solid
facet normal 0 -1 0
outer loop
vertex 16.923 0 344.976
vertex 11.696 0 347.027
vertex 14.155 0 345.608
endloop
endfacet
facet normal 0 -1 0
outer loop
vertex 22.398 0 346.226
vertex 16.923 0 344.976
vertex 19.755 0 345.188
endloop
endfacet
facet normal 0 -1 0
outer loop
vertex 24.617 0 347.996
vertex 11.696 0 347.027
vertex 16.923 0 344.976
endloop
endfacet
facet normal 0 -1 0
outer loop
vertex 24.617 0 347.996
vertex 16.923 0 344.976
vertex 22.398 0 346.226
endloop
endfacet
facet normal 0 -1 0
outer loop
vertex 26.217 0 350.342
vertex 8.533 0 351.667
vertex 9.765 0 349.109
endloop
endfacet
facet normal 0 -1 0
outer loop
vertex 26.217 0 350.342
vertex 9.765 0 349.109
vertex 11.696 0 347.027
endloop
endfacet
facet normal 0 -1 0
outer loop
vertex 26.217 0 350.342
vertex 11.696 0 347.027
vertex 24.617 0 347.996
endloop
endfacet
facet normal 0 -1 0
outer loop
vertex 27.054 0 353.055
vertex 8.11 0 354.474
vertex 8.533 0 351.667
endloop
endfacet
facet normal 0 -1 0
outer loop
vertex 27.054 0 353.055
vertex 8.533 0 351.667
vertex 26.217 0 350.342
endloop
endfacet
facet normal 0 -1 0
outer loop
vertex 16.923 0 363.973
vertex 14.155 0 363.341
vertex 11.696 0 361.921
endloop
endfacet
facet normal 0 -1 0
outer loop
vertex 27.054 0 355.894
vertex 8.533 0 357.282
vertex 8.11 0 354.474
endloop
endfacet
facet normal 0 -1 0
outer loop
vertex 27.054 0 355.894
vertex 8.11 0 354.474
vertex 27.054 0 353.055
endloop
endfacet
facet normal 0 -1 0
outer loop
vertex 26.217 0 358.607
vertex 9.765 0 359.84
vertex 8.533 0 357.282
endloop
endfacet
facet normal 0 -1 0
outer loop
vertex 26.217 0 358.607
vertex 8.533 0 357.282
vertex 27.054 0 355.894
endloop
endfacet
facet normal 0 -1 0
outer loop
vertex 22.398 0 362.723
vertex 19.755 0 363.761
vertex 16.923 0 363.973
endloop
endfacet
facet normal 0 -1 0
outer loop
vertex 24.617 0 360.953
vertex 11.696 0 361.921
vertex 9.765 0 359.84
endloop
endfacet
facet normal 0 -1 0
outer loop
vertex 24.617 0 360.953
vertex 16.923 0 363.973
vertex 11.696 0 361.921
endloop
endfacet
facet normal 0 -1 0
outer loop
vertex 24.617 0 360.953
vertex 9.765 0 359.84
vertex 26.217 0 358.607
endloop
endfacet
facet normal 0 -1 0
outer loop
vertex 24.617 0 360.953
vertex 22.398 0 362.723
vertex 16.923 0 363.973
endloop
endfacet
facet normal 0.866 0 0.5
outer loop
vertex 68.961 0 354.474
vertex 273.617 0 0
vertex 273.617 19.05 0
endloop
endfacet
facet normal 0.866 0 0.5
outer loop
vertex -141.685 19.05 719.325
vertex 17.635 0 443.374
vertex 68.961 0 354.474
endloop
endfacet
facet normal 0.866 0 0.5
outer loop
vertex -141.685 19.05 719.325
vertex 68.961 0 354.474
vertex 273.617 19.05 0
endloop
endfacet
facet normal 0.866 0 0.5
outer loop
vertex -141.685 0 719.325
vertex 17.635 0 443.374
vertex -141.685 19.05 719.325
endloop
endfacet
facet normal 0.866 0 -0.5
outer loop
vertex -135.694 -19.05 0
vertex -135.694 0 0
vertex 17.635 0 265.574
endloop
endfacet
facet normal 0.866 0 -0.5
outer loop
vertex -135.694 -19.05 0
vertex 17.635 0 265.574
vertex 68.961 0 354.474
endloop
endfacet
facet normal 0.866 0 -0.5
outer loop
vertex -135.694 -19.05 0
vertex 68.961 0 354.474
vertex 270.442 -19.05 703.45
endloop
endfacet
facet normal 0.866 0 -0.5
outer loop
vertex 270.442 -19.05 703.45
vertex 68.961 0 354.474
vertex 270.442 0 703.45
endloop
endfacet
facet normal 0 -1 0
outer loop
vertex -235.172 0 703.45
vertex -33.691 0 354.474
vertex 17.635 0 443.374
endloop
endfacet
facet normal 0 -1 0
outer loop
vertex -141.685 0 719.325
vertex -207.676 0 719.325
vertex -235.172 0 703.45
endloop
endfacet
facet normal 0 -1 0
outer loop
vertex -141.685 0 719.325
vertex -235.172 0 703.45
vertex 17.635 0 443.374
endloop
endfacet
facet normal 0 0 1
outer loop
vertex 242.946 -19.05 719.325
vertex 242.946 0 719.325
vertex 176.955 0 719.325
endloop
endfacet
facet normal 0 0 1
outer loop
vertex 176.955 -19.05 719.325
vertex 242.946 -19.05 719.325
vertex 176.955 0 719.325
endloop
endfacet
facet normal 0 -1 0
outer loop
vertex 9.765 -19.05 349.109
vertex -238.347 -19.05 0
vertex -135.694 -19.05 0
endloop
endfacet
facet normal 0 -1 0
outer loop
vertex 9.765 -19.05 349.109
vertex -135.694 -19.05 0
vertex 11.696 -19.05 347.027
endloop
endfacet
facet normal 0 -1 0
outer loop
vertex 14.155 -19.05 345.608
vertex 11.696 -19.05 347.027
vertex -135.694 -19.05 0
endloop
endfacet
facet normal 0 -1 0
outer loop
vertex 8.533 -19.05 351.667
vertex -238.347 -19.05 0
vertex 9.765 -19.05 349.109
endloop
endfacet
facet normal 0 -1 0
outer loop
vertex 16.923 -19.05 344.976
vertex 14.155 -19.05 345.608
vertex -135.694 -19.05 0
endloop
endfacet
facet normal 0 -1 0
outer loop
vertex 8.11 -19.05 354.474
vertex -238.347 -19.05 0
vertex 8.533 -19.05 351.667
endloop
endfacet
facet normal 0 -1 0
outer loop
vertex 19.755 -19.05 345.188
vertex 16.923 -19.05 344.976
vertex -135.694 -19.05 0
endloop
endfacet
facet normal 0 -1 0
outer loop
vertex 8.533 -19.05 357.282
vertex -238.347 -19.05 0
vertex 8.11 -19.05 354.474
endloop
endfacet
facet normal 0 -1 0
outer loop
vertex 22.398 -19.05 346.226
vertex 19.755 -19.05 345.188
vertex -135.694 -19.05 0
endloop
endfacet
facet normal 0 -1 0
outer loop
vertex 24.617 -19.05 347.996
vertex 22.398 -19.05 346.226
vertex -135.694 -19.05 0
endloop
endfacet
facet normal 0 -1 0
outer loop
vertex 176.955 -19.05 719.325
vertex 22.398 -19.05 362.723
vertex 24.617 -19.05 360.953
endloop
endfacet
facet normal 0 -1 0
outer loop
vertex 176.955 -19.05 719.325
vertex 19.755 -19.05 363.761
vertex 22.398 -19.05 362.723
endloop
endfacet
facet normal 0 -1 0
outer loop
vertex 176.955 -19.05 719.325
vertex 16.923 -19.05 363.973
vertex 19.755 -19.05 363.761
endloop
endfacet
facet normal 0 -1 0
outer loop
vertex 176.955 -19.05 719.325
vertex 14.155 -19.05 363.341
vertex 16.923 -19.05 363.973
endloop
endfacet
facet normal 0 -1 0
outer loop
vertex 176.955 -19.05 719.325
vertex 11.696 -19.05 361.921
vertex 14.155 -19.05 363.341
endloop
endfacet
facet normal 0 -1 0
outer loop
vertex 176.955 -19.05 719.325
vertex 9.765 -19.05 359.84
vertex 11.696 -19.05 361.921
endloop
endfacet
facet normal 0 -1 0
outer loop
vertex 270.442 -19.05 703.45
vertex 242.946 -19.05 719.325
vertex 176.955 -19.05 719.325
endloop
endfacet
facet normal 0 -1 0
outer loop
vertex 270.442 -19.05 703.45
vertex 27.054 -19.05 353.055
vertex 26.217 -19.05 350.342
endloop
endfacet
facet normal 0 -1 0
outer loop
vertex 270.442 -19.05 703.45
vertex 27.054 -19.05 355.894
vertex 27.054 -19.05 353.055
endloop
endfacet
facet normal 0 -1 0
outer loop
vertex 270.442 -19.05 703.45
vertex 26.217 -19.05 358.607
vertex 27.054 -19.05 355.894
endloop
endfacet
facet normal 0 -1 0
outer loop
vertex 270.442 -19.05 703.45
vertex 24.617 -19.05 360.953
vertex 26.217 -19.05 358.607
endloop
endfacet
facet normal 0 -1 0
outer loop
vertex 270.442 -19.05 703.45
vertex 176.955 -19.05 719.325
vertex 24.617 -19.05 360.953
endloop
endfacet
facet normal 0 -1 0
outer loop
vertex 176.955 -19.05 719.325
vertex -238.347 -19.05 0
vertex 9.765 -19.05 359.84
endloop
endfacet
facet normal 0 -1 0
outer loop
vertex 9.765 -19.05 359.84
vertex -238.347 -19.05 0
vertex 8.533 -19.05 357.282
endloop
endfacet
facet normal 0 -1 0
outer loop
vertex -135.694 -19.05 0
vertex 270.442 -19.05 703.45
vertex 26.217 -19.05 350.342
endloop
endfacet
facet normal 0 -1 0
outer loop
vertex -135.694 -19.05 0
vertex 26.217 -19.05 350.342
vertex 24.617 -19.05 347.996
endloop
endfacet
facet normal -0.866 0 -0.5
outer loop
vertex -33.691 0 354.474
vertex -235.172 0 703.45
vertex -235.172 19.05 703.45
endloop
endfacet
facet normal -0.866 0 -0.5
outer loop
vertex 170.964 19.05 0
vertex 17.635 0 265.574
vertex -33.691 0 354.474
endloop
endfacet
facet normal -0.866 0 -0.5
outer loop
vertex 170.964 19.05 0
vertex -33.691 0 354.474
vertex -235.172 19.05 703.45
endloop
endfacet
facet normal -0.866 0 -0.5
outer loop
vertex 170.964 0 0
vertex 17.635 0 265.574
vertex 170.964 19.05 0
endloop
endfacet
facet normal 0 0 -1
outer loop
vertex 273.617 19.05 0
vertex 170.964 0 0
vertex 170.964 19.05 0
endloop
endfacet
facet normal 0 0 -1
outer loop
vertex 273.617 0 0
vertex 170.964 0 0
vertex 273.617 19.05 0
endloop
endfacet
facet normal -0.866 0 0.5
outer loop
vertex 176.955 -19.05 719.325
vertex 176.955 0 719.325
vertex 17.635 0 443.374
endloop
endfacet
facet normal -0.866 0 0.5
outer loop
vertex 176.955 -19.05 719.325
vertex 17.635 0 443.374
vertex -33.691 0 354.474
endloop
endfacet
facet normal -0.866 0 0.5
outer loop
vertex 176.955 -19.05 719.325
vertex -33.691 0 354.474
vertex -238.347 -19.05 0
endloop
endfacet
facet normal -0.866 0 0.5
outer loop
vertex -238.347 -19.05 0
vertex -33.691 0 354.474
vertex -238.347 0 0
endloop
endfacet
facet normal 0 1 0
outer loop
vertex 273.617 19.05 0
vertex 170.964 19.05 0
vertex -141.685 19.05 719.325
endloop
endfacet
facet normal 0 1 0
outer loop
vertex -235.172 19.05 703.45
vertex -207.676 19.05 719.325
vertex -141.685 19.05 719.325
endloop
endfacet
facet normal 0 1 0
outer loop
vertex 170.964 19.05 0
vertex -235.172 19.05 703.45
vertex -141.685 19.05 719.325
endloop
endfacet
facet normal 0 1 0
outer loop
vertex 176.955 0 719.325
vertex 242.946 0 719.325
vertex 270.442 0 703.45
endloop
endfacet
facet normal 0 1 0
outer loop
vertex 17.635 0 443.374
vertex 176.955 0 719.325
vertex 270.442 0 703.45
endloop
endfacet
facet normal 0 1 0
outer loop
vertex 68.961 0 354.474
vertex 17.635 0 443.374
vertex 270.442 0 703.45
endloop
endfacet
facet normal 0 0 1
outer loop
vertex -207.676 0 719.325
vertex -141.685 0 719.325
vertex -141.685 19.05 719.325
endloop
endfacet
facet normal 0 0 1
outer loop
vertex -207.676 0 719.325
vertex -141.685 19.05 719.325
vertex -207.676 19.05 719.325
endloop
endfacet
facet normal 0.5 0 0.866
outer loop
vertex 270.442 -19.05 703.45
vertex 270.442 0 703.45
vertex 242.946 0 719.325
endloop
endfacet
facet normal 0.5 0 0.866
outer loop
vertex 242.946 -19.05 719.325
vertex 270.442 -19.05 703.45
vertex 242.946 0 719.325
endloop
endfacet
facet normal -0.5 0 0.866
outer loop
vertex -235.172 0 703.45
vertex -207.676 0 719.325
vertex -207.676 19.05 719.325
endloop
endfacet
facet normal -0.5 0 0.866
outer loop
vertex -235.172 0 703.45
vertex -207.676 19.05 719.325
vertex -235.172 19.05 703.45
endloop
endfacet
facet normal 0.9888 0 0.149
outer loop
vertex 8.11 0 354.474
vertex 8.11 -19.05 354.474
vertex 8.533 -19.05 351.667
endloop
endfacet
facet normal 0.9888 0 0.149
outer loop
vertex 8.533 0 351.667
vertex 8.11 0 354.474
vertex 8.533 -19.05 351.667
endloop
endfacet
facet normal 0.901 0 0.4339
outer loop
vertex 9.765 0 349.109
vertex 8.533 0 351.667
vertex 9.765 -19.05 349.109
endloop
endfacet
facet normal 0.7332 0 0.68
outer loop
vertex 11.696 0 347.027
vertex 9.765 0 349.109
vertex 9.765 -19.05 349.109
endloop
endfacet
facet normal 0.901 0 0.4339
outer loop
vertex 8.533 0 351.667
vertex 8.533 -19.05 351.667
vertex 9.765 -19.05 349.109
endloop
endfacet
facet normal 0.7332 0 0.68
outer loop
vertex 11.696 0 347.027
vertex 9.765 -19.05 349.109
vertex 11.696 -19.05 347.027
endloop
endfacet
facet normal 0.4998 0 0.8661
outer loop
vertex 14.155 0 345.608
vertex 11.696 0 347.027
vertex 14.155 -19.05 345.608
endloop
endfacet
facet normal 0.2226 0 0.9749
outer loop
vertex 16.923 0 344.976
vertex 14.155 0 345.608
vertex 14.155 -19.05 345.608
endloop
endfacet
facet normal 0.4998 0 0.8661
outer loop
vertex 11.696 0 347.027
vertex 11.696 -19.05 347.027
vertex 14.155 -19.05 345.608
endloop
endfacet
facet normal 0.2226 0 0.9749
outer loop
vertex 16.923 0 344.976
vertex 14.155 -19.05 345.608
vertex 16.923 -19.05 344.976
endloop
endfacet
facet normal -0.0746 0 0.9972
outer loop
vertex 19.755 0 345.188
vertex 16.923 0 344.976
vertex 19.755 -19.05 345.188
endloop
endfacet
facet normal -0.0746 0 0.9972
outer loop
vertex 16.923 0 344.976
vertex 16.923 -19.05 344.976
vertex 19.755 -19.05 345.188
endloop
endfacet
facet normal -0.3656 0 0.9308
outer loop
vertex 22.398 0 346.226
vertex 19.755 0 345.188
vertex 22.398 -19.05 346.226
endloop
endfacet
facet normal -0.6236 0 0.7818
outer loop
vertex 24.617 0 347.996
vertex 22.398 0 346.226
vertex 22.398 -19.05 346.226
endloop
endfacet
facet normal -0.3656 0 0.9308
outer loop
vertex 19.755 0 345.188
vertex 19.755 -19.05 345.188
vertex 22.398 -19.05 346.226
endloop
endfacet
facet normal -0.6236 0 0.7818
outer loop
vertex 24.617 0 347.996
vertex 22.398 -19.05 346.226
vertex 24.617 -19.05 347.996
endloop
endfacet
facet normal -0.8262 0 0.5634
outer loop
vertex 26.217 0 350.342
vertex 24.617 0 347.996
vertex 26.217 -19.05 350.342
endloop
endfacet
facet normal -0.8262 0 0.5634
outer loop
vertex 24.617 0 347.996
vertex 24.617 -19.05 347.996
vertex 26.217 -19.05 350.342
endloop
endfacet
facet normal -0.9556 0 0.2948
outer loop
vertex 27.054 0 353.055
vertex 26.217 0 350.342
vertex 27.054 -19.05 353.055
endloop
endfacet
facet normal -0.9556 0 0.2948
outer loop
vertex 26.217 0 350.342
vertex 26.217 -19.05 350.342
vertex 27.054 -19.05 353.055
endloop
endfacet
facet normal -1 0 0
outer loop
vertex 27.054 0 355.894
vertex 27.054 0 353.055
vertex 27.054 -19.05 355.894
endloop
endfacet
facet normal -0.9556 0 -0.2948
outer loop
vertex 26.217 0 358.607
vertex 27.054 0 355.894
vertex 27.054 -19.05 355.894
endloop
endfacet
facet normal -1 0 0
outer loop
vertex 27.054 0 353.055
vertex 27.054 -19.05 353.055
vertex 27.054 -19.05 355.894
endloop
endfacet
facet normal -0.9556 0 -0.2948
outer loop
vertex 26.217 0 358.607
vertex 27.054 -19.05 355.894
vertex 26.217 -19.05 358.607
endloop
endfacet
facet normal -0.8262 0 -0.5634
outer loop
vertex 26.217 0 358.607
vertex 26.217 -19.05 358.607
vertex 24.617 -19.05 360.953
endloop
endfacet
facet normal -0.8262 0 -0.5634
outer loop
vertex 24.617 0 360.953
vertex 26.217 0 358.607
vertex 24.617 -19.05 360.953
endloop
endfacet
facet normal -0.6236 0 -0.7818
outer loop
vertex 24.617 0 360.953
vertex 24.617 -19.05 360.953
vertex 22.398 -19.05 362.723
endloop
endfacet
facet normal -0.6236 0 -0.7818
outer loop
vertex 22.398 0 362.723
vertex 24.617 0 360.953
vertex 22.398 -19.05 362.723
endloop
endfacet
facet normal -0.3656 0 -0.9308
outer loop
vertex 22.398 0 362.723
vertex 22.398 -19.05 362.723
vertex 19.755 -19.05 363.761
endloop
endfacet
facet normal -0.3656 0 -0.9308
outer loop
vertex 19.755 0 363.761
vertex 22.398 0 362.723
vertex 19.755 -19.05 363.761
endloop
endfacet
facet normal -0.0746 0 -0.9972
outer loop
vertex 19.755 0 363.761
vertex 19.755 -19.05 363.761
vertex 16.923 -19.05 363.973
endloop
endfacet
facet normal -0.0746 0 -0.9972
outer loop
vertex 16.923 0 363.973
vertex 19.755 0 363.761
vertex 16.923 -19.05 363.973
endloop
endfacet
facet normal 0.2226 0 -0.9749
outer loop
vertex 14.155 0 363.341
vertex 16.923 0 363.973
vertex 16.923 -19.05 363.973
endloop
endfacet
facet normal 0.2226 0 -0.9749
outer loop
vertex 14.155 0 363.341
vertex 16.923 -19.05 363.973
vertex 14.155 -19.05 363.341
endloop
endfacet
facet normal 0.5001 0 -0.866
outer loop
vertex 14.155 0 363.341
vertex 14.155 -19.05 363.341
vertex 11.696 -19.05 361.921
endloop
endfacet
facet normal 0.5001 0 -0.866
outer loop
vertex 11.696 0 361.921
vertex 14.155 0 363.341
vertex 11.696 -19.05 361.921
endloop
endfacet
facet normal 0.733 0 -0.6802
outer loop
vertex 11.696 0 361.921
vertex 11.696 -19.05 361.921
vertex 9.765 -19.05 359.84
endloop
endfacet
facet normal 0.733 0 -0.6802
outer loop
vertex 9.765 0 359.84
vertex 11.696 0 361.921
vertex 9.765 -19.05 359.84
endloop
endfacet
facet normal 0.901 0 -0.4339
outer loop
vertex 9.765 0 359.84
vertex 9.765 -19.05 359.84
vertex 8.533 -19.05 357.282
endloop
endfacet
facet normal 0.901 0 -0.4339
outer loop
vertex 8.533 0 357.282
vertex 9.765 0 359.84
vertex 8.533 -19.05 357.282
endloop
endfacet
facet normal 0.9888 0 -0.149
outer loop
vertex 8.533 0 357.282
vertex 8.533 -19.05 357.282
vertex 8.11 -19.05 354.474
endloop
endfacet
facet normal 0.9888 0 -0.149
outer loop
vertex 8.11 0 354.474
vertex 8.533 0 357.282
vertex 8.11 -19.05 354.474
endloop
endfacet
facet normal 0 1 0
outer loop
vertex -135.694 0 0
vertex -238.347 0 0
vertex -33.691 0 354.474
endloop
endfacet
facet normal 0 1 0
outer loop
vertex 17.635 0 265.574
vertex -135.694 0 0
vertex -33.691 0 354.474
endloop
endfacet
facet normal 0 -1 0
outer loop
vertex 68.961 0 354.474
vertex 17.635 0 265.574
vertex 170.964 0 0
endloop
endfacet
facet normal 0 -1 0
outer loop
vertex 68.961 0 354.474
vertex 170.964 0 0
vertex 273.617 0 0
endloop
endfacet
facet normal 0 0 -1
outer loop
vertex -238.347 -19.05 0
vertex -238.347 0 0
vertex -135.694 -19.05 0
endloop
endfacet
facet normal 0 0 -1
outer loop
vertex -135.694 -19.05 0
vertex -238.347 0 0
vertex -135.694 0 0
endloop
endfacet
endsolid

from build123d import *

# Parameters (mm, degrees)
F1_DEPTH = 19.05
F3_D     = 19.05
F5_DEPTH = 19.05


with BuildPart() as f1:
    # F0 (on Front) → F1 (new body)
    with BuildSketch(Plane.XZ):
        Polygon((176.9548937415, 719.3245387082), (-238.3473223164, 0), (-135.6944444544, 0), (270.4423360801, 703.4495387082), (242.9460295099, 719.3245387082), align=None)
    extrude(amount=F1_DEPTH)

    # F3 (through all)
    with Locations(Plane(origin=(0, 0, 0), x_dir=(1, 0, 0), z_dir=(0, 1, 0))):
        with Locations((17.6350068819, -354.4744000111)):
            Hole(F3_D / 2)

    # F4 (on Front) → F5 (join)
    with BuildSketch(Plane.XZ):
        Polygon((170.9644582182, 0), (273.6173360801, 0), (-141.6848799778, 719.3245387082), (-207.6760157462, 719.3245387082), (-235.1723223164, 703.4495387082), align=None)
    extrude(amount=-F5_DEPTH)


solid = f1.part
